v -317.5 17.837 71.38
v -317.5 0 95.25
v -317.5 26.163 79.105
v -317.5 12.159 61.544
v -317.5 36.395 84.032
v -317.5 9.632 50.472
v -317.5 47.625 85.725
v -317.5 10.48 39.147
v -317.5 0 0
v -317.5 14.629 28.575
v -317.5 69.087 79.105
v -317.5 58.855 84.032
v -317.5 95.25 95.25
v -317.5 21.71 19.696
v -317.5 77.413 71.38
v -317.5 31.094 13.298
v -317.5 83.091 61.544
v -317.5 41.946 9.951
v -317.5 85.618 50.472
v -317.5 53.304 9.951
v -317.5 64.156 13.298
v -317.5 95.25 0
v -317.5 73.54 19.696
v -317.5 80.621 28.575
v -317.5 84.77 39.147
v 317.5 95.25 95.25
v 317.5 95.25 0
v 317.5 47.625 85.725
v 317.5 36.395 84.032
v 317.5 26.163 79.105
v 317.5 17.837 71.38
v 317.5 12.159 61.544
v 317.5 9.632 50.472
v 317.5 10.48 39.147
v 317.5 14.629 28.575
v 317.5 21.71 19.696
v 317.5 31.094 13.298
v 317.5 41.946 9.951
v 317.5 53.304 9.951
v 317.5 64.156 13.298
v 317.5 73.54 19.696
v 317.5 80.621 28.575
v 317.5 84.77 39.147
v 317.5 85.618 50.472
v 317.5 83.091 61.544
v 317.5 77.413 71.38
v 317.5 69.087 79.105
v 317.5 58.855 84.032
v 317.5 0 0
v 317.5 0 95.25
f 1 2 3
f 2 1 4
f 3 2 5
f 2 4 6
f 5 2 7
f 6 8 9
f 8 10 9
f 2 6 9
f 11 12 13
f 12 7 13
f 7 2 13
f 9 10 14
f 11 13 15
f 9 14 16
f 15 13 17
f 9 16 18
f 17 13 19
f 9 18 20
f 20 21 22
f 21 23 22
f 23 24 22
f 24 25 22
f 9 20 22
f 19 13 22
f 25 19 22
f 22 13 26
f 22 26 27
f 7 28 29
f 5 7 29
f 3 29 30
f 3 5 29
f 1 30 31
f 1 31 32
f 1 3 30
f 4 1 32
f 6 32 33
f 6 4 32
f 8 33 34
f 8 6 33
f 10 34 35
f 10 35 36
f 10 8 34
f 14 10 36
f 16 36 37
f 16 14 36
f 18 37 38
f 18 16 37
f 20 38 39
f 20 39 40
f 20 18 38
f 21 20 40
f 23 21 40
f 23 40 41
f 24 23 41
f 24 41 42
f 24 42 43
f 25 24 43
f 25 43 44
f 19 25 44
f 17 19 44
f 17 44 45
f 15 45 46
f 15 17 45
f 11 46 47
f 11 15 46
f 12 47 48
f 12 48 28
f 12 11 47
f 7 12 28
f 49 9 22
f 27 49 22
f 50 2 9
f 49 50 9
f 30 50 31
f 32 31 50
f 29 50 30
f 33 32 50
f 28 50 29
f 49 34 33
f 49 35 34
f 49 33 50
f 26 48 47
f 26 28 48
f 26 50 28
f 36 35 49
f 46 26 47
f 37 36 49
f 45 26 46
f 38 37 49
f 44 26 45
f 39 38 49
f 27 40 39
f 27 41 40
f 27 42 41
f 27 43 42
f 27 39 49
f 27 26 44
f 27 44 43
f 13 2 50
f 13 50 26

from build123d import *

# Parameters (mm, degrees)
SKETCH1_W           = 95.25
SKETCH1_H           = 95.25
SKETCH1_R           = 38.1
BOSS_EXTRUDE1_DEPTH = 317.5


with BuildPart() as part:
    # Sketch1 → Boss-Extrude1 (new, symmetric)
    with BuildSketch(Plane(origin=(0, 0, 0), x_dir=(0, 0, -1), z_dir=(1, 0, 0))):
        with Locations((-47.625, 47.625)):
            Rectangle(SKETCH1_W, SKETCH1_H)
        with Locations(Location((-47.625, 47.625, 0), (0, 0, 180))):
            Circle(SKETCH1_R, mode=Mode.SUBTRACT)
    extrude(amount=BOSS_EXTRUDE1_DEPTH, both=True)


solid = part.part
